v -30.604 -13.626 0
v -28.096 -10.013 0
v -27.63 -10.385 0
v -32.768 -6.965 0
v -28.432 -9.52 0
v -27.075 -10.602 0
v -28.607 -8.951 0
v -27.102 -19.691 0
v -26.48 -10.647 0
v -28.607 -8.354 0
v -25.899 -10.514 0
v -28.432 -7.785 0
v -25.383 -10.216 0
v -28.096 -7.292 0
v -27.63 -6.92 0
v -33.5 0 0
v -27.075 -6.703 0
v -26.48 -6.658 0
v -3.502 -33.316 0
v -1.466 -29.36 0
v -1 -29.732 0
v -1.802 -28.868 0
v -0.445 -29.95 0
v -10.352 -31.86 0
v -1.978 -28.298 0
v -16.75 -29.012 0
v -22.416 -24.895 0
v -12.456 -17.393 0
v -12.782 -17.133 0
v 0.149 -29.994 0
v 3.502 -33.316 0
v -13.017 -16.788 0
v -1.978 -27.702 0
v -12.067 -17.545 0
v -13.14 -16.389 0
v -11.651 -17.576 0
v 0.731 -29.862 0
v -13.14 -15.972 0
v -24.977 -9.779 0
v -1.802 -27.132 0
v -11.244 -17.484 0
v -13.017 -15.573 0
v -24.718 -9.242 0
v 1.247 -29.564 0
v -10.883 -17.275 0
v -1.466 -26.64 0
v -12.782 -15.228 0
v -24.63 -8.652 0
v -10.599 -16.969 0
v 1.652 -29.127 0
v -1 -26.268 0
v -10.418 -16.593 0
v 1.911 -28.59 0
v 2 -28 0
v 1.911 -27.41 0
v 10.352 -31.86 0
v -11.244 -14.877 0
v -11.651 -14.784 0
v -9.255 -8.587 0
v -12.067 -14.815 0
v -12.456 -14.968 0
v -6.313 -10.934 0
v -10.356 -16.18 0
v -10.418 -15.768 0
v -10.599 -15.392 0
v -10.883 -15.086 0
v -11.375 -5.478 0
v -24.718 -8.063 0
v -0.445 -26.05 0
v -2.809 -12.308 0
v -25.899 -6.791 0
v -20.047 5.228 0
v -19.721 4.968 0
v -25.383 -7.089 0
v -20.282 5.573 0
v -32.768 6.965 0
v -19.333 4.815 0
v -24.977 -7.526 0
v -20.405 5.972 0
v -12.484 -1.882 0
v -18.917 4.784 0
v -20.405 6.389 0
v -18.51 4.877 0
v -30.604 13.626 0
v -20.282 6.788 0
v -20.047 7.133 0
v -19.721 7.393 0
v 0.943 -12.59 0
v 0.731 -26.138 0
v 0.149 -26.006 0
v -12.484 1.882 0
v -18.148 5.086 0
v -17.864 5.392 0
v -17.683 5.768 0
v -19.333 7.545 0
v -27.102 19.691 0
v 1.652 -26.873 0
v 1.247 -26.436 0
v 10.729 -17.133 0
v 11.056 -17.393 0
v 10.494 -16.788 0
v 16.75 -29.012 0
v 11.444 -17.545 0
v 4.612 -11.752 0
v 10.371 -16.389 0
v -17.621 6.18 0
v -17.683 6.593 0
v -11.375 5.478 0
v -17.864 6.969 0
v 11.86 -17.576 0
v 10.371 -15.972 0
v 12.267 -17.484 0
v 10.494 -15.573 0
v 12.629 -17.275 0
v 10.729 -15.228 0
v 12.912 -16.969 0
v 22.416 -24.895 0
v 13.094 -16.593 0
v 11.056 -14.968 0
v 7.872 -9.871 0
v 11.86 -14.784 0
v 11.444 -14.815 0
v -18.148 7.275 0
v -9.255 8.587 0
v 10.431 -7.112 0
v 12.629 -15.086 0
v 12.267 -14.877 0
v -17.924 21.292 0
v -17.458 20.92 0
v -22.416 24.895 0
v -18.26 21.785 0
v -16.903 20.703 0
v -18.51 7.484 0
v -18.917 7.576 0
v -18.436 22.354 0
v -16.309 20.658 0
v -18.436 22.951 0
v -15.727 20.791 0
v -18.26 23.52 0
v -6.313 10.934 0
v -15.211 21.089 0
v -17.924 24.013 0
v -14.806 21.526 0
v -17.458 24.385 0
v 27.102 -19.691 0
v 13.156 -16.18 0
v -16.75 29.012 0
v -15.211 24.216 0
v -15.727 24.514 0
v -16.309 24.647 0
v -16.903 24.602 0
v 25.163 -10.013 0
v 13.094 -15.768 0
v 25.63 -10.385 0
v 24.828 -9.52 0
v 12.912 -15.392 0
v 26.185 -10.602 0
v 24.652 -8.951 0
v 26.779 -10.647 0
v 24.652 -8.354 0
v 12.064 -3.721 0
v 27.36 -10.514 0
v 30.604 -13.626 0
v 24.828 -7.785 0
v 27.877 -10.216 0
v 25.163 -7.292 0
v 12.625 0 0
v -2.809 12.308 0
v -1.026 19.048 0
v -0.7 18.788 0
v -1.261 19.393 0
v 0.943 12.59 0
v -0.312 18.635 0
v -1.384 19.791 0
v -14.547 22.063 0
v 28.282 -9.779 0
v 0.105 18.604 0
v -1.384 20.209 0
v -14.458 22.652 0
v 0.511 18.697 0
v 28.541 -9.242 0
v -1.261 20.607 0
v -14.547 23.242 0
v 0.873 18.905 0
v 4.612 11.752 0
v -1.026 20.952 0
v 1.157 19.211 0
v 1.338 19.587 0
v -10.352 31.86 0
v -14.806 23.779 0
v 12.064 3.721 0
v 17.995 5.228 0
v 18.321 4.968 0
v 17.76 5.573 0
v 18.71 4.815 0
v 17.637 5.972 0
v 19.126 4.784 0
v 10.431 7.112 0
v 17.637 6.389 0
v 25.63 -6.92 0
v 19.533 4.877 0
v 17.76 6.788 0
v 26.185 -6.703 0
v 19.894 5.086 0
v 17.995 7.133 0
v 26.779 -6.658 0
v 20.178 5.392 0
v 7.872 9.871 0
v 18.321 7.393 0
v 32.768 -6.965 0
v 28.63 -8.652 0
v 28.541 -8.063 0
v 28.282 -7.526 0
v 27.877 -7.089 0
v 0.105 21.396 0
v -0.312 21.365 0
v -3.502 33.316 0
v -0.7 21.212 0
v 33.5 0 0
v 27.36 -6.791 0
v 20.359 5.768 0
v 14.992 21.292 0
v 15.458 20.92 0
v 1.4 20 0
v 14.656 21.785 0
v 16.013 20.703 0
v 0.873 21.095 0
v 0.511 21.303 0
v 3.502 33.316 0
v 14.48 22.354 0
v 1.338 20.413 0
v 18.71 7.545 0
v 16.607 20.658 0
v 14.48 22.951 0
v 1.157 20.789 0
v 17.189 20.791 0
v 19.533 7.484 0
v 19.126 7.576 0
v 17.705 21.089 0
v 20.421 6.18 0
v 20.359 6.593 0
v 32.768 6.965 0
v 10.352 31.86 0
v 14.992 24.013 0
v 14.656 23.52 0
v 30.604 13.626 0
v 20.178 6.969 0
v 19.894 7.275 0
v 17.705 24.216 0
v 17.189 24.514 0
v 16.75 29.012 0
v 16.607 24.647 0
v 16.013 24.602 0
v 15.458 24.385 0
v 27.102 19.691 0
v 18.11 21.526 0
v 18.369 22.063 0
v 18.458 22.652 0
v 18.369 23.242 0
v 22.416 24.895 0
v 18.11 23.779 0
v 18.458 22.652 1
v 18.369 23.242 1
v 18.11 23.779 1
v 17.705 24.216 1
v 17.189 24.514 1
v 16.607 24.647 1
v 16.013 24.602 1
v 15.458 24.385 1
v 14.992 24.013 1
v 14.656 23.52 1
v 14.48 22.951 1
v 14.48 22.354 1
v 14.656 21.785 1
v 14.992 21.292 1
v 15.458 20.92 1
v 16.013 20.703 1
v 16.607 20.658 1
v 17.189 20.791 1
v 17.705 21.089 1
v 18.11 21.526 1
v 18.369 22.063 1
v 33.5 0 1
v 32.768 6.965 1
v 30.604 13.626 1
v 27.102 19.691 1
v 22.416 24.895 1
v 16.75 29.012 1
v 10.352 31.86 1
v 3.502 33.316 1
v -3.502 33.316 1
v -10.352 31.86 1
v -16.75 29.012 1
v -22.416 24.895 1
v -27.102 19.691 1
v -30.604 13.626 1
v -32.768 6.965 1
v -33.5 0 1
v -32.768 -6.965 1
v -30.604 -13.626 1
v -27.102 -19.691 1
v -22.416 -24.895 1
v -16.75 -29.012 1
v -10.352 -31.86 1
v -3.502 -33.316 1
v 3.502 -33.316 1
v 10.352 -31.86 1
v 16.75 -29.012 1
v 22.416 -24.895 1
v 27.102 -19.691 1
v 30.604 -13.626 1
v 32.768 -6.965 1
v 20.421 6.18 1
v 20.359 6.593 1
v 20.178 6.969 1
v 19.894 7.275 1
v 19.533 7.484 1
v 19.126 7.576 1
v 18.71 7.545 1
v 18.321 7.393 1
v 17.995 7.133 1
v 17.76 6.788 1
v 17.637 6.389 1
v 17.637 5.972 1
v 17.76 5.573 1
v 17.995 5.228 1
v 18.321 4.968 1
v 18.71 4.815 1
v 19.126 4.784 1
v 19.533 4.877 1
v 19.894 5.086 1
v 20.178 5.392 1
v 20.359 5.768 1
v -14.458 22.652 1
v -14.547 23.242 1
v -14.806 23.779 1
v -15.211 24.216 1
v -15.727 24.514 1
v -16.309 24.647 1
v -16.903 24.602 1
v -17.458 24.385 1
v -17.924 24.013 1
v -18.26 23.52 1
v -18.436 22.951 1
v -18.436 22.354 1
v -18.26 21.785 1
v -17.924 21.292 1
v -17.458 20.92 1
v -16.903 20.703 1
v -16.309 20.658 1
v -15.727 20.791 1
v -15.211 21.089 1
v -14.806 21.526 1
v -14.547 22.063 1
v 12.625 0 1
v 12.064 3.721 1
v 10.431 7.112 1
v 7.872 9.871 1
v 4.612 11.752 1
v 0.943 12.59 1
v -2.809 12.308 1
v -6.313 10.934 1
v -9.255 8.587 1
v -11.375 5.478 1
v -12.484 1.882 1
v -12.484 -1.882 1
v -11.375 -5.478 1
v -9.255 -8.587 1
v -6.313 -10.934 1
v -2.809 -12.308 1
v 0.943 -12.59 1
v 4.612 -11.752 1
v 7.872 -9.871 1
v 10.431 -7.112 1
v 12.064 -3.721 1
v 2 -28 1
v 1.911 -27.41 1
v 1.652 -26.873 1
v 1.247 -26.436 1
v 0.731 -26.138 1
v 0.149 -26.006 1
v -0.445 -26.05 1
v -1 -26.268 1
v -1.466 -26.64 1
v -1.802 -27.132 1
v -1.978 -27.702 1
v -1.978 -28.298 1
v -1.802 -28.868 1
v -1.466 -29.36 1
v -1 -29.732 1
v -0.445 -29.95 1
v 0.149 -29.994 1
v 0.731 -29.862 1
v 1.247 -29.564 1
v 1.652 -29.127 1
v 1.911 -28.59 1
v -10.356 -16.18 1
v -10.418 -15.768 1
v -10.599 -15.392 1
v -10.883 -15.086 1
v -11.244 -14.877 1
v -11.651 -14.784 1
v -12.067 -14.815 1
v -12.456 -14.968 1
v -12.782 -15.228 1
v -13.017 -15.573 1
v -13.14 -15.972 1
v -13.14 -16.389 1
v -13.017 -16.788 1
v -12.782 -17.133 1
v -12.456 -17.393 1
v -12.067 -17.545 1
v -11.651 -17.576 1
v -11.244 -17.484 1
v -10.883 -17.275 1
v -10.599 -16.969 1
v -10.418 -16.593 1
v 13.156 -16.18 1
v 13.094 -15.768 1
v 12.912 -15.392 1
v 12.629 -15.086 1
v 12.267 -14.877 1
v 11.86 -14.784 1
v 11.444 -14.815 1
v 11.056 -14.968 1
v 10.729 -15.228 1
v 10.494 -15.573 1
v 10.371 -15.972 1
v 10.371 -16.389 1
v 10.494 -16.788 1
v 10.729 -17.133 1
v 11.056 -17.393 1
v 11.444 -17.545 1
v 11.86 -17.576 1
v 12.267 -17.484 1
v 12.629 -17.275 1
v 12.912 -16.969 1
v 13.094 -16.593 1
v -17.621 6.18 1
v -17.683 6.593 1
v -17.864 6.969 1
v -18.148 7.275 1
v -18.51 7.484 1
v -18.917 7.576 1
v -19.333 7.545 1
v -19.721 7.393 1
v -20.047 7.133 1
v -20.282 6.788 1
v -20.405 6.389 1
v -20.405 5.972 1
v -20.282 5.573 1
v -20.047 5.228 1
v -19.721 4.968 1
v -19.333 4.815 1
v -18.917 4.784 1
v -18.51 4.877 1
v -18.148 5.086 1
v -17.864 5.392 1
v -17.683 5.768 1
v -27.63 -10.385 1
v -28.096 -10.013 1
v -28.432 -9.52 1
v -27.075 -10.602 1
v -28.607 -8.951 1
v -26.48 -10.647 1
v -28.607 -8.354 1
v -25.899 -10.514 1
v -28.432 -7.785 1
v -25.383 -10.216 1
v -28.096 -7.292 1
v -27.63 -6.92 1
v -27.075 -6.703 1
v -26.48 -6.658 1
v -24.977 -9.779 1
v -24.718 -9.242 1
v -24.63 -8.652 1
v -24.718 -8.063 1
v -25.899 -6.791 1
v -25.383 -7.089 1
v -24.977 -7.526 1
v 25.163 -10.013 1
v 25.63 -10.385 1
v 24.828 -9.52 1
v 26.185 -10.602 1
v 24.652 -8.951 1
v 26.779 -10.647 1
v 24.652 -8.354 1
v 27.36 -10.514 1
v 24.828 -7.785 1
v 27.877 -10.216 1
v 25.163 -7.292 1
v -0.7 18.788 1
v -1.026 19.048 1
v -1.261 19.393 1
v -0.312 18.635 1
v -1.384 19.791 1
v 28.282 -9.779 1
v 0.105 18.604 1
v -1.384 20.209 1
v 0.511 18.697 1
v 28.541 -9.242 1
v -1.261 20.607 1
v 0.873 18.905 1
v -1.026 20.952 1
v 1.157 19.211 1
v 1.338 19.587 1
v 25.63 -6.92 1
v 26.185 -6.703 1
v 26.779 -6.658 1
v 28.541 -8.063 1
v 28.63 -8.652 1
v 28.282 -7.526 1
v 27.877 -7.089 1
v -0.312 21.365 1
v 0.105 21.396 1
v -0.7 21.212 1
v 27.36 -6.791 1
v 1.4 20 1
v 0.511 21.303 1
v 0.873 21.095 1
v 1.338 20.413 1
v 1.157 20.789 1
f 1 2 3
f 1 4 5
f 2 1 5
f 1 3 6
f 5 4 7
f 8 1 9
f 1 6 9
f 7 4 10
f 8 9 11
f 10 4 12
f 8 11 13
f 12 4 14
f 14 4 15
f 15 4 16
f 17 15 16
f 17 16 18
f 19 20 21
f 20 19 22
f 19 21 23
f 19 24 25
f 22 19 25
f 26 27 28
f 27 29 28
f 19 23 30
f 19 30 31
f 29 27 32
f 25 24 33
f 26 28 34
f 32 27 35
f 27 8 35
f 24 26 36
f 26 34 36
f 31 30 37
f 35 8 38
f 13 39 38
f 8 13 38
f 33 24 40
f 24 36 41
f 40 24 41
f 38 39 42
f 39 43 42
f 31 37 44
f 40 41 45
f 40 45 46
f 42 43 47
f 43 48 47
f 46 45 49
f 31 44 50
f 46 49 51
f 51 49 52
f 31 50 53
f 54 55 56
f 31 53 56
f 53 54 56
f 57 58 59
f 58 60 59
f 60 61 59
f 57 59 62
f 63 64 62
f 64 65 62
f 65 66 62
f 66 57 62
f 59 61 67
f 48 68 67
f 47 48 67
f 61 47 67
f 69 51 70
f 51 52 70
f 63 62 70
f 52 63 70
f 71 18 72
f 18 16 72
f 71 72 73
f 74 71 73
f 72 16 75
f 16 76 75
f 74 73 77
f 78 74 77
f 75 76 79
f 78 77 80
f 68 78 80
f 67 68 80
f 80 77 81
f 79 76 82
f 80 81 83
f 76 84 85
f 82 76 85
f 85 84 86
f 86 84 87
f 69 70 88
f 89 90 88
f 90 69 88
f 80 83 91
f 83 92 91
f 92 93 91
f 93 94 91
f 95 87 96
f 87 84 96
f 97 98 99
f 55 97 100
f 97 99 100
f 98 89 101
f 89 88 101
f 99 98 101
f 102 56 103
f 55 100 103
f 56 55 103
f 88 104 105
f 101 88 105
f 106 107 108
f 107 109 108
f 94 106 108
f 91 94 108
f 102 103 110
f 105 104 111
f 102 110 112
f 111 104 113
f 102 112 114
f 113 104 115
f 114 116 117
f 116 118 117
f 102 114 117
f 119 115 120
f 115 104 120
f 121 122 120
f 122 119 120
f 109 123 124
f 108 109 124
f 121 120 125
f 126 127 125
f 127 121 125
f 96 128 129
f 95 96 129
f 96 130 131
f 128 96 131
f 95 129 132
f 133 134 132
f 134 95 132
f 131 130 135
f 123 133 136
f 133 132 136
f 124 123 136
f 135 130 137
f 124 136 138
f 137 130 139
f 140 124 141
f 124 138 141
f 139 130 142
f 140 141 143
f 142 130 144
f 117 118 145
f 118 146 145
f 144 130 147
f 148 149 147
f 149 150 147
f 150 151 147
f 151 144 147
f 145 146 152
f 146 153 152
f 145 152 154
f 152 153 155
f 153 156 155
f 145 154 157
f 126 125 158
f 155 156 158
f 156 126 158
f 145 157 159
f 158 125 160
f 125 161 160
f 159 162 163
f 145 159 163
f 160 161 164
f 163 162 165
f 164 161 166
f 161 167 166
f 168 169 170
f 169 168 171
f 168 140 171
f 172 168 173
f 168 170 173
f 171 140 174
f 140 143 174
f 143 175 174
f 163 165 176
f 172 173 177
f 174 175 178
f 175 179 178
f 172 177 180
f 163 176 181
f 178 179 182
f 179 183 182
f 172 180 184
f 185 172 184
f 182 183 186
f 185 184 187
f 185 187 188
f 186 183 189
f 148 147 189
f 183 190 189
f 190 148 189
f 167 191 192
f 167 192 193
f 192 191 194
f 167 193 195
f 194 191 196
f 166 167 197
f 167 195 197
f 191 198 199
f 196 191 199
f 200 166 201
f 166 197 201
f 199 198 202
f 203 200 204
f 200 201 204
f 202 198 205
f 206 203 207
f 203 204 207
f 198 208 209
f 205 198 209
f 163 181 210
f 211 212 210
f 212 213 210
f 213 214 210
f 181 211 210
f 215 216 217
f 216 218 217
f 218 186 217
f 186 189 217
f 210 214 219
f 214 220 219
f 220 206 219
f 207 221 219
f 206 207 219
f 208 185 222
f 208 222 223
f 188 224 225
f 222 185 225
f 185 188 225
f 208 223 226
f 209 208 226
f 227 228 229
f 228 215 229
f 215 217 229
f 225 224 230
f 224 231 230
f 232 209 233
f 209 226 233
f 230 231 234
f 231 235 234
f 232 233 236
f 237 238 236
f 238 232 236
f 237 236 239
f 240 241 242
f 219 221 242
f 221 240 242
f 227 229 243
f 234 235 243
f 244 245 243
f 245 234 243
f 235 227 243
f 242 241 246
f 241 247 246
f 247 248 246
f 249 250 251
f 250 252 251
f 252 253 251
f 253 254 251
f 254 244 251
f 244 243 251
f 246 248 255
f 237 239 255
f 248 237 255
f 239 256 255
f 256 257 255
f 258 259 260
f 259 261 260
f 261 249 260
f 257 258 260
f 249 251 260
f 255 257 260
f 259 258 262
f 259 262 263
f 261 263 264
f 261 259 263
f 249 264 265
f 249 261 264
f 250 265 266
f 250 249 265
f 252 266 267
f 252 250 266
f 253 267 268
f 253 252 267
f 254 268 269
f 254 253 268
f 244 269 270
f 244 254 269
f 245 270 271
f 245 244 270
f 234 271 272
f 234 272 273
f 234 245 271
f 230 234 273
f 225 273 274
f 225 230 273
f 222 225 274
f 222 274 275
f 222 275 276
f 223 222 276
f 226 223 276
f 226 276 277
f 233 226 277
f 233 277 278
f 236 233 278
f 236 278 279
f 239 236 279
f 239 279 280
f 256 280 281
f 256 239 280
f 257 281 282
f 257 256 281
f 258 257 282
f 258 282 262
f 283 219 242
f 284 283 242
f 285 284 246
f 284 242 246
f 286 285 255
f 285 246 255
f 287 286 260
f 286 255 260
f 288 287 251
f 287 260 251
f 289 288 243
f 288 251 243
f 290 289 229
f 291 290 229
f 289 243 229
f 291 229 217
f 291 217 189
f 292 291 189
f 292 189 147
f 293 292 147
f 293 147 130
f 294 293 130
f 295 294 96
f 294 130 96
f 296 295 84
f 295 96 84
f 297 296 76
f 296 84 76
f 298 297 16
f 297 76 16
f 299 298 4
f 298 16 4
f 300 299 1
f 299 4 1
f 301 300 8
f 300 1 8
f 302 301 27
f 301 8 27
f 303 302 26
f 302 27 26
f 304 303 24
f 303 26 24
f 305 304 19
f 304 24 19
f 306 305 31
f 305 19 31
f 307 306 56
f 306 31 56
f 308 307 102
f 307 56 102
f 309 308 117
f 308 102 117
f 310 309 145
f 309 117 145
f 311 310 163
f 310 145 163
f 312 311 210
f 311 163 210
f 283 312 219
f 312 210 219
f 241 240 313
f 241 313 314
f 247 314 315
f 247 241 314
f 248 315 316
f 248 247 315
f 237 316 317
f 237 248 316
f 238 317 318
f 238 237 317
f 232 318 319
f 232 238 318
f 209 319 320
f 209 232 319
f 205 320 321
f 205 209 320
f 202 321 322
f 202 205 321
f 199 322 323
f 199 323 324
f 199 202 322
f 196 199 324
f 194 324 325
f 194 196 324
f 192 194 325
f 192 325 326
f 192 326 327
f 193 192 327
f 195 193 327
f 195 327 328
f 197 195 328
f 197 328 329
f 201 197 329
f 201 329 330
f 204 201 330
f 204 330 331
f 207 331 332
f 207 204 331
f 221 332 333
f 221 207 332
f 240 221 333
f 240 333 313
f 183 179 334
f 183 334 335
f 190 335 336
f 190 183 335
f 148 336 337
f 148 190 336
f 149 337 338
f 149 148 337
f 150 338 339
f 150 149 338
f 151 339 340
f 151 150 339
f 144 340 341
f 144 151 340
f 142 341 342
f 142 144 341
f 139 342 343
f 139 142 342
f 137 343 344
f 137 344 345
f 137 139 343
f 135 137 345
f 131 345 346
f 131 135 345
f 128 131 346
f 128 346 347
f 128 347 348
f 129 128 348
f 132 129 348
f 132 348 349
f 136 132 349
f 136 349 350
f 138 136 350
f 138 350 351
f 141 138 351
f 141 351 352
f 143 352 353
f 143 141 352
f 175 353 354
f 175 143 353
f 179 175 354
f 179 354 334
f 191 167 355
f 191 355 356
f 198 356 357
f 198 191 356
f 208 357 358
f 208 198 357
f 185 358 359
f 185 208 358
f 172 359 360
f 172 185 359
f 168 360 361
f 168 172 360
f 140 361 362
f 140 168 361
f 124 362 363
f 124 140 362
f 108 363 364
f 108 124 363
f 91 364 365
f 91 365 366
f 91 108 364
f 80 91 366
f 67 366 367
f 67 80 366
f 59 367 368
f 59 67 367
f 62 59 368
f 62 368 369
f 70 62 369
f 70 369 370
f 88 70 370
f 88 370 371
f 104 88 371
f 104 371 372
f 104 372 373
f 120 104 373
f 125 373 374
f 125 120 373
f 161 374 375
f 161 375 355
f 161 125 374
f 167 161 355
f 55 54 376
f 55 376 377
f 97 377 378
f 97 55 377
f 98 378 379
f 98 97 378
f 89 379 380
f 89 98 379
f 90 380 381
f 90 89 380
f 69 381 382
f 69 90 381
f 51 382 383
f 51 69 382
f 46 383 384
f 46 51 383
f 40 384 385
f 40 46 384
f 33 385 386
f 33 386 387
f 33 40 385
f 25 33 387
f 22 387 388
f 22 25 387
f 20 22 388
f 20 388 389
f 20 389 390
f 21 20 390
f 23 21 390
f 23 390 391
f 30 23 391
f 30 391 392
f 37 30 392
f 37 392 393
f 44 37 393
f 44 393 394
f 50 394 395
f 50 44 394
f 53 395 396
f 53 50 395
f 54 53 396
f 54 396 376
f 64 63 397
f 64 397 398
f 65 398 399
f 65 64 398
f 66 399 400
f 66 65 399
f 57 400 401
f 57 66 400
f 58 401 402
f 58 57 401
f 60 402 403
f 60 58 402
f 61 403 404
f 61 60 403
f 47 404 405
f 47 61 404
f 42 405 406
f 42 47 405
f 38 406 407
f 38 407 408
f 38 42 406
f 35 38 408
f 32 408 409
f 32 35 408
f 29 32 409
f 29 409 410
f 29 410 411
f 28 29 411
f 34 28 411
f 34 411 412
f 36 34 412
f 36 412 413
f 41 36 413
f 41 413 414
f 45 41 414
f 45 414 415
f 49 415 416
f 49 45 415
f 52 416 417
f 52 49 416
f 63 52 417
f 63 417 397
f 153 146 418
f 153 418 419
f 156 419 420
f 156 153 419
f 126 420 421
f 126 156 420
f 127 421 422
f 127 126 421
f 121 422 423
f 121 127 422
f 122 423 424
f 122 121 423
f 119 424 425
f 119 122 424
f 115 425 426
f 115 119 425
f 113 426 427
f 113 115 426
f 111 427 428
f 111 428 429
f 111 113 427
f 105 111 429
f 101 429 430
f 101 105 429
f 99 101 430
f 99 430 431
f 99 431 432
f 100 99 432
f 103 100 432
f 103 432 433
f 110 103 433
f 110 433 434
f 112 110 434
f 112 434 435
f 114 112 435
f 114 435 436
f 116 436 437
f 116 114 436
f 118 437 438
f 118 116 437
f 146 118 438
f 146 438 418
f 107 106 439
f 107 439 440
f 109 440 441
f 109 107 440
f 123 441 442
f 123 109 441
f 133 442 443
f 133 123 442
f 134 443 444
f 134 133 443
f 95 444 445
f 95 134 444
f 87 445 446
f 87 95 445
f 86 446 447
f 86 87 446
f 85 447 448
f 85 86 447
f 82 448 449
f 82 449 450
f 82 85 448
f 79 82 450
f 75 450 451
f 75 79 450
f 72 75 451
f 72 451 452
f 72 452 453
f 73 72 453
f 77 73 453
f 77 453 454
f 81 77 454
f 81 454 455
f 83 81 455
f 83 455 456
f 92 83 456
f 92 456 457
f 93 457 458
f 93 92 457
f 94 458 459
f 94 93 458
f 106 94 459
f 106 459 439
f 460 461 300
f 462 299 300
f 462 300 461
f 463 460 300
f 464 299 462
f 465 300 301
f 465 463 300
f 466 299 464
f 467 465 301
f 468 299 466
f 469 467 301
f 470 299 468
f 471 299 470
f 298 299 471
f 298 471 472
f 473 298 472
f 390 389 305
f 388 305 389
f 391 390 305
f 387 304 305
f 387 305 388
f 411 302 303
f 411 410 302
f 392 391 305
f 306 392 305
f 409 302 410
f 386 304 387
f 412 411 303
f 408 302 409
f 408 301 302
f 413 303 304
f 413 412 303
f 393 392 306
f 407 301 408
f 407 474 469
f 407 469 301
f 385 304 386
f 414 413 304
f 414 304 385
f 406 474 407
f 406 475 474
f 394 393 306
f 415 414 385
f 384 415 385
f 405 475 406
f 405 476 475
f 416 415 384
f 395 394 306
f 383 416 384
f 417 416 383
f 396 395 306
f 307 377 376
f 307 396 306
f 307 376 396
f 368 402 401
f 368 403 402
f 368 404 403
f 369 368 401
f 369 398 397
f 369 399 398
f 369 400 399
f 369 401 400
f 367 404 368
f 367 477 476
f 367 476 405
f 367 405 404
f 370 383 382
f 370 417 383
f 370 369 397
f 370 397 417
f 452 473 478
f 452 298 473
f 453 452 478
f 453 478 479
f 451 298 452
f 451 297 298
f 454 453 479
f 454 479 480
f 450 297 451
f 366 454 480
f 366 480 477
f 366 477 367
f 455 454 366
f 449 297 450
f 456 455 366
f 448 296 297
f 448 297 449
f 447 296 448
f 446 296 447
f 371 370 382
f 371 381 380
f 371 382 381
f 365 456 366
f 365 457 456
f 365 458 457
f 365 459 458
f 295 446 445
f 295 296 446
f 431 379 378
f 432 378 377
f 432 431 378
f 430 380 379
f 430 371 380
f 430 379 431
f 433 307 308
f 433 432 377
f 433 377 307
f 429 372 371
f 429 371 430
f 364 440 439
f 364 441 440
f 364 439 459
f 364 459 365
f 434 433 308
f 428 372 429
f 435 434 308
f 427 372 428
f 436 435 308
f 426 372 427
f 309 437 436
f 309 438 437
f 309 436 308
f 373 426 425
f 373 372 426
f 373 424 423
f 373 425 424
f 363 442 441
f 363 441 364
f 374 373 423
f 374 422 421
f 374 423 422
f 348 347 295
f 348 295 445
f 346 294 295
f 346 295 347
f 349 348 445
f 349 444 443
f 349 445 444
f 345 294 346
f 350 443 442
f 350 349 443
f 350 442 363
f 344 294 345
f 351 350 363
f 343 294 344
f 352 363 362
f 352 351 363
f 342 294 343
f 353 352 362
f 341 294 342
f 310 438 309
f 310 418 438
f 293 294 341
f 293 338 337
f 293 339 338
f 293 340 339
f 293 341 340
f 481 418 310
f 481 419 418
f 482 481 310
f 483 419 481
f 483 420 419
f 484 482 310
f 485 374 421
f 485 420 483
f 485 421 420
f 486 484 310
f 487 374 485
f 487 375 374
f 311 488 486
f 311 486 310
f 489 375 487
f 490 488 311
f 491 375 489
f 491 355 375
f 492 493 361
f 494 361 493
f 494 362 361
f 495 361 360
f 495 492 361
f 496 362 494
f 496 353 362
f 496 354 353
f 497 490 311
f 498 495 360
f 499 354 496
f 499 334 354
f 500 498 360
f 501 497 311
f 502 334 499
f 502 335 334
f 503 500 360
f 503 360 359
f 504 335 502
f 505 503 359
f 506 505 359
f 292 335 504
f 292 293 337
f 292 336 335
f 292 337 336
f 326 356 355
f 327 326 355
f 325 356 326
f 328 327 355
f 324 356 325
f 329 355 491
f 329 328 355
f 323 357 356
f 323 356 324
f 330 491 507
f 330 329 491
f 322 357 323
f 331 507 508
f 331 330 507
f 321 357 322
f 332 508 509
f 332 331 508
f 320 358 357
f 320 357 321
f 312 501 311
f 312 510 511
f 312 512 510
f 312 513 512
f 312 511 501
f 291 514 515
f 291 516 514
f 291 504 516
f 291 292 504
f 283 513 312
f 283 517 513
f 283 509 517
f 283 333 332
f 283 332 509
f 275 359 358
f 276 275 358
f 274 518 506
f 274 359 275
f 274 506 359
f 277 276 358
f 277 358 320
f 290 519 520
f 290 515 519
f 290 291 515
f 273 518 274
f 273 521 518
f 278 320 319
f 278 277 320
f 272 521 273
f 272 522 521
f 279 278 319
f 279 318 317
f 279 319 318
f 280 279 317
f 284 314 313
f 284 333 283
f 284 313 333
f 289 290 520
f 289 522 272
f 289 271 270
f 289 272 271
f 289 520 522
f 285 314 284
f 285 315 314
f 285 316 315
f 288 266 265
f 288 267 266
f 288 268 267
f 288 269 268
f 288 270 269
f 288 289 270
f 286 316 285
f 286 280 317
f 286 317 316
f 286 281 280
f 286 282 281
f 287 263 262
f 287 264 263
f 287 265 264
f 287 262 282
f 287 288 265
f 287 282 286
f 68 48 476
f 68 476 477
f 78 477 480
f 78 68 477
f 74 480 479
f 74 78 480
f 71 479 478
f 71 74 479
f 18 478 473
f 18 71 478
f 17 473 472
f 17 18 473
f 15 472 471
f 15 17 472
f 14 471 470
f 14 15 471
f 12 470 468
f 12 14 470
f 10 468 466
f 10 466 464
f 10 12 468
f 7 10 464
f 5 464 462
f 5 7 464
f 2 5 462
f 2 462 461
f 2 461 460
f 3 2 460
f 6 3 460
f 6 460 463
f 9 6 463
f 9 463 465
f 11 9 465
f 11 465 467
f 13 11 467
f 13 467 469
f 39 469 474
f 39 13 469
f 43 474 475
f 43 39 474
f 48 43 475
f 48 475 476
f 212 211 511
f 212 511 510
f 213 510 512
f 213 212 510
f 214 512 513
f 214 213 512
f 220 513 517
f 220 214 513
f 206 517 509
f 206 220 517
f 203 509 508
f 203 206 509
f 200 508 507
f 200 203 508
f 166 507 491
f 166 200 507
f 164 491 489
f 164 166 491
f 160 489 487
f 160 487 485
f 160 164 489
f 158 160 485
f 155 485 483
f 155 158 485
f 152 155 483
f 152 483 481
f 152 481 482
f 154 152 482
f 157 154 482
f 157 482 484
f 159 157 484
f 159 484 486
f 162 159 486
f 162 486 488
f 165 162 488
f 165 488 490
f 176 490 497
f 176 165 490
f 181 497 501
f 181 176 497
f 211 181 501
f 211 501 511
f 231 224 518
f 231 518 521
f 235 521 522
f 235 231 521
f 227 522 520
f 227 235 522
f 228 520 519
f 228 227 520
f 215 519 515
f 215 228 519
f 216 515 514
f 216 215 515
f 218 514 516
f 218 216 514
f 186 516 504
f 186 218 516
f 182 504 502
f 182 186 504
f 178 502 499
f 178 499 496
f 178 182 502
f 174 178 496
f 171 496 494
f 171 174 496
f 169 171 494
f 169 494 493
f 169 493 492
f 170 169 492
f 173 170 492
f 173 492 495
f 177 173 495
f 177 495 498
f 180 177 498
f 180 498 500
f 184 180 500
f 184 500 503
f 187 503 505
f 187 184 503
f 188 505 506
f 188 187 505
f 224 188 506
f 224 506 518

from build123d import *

# Parameters (mm, degrees)
SKETCH_1_R      = 33.5
SKETCH_1_R_2    = 12.625
SKETCH_1_R_3    = 2
SKETCH_1_R_4    = 1.4
EXTRUDE_1_DEPTH = 1


with BuildPart() as part:
    # 草图1 → 凸台-拉伸1 (new body)
    with BuildSketch(Plane.XY):
        Circle(SKETCH_1_R)
        Circle(SKETCH_1_R_2, mode=Mode.SUBTRACT)
        with Locations((0, -28)):
            Circle(SKETCH_1_R_3, mode=Mode.SUBTRACT)
        with Locations((-26.629582456, -8.652475842)):
            Circle(SKETCH_1_R_3, mode=Mode.SUBTRACT)
        with Locations((-16.457987064, 22.652475842)):
            Circle(SKETCH_1_R_3, mode=Mode.SUBTRACT)
        with Locations((16.457987064, 22.652475842)):
            Circle(SKETCH_1_R_3, mode=Mode.SUBTRACT)
        with Locations((26.629582456, -8.652475842)):
            Circle(SKETCH_1_R_3, mode=Mode.SUBTRACT)
        with Locations((-11.755705046, -16.180339887)):
            Circle(SKETCH_1_R_4, mode=Mode.SUBTRACT)
        with Locations((-19.021130326, 6.180339887)):
            Circle(SKETCH_1_R_4, mode=Mode.SUBTRACT)
        with Locations((0, 20)):
            Circle(SKETCH_1_R_4, mode=Mode.SUBTRACT)
        with Locations((19.021130326, 6.180339887)):
            Circle(SKETCH_1_R_4, mode=Mode.SUBTRACT)
        with Locations((11.755705046, -16.180339887)):
            Circle(SKETCH_1_R_4, mode=Mode.SUBTRACT)
    extrude(amount=EXTRUDE_1_DEPTH)


solid = part.part
